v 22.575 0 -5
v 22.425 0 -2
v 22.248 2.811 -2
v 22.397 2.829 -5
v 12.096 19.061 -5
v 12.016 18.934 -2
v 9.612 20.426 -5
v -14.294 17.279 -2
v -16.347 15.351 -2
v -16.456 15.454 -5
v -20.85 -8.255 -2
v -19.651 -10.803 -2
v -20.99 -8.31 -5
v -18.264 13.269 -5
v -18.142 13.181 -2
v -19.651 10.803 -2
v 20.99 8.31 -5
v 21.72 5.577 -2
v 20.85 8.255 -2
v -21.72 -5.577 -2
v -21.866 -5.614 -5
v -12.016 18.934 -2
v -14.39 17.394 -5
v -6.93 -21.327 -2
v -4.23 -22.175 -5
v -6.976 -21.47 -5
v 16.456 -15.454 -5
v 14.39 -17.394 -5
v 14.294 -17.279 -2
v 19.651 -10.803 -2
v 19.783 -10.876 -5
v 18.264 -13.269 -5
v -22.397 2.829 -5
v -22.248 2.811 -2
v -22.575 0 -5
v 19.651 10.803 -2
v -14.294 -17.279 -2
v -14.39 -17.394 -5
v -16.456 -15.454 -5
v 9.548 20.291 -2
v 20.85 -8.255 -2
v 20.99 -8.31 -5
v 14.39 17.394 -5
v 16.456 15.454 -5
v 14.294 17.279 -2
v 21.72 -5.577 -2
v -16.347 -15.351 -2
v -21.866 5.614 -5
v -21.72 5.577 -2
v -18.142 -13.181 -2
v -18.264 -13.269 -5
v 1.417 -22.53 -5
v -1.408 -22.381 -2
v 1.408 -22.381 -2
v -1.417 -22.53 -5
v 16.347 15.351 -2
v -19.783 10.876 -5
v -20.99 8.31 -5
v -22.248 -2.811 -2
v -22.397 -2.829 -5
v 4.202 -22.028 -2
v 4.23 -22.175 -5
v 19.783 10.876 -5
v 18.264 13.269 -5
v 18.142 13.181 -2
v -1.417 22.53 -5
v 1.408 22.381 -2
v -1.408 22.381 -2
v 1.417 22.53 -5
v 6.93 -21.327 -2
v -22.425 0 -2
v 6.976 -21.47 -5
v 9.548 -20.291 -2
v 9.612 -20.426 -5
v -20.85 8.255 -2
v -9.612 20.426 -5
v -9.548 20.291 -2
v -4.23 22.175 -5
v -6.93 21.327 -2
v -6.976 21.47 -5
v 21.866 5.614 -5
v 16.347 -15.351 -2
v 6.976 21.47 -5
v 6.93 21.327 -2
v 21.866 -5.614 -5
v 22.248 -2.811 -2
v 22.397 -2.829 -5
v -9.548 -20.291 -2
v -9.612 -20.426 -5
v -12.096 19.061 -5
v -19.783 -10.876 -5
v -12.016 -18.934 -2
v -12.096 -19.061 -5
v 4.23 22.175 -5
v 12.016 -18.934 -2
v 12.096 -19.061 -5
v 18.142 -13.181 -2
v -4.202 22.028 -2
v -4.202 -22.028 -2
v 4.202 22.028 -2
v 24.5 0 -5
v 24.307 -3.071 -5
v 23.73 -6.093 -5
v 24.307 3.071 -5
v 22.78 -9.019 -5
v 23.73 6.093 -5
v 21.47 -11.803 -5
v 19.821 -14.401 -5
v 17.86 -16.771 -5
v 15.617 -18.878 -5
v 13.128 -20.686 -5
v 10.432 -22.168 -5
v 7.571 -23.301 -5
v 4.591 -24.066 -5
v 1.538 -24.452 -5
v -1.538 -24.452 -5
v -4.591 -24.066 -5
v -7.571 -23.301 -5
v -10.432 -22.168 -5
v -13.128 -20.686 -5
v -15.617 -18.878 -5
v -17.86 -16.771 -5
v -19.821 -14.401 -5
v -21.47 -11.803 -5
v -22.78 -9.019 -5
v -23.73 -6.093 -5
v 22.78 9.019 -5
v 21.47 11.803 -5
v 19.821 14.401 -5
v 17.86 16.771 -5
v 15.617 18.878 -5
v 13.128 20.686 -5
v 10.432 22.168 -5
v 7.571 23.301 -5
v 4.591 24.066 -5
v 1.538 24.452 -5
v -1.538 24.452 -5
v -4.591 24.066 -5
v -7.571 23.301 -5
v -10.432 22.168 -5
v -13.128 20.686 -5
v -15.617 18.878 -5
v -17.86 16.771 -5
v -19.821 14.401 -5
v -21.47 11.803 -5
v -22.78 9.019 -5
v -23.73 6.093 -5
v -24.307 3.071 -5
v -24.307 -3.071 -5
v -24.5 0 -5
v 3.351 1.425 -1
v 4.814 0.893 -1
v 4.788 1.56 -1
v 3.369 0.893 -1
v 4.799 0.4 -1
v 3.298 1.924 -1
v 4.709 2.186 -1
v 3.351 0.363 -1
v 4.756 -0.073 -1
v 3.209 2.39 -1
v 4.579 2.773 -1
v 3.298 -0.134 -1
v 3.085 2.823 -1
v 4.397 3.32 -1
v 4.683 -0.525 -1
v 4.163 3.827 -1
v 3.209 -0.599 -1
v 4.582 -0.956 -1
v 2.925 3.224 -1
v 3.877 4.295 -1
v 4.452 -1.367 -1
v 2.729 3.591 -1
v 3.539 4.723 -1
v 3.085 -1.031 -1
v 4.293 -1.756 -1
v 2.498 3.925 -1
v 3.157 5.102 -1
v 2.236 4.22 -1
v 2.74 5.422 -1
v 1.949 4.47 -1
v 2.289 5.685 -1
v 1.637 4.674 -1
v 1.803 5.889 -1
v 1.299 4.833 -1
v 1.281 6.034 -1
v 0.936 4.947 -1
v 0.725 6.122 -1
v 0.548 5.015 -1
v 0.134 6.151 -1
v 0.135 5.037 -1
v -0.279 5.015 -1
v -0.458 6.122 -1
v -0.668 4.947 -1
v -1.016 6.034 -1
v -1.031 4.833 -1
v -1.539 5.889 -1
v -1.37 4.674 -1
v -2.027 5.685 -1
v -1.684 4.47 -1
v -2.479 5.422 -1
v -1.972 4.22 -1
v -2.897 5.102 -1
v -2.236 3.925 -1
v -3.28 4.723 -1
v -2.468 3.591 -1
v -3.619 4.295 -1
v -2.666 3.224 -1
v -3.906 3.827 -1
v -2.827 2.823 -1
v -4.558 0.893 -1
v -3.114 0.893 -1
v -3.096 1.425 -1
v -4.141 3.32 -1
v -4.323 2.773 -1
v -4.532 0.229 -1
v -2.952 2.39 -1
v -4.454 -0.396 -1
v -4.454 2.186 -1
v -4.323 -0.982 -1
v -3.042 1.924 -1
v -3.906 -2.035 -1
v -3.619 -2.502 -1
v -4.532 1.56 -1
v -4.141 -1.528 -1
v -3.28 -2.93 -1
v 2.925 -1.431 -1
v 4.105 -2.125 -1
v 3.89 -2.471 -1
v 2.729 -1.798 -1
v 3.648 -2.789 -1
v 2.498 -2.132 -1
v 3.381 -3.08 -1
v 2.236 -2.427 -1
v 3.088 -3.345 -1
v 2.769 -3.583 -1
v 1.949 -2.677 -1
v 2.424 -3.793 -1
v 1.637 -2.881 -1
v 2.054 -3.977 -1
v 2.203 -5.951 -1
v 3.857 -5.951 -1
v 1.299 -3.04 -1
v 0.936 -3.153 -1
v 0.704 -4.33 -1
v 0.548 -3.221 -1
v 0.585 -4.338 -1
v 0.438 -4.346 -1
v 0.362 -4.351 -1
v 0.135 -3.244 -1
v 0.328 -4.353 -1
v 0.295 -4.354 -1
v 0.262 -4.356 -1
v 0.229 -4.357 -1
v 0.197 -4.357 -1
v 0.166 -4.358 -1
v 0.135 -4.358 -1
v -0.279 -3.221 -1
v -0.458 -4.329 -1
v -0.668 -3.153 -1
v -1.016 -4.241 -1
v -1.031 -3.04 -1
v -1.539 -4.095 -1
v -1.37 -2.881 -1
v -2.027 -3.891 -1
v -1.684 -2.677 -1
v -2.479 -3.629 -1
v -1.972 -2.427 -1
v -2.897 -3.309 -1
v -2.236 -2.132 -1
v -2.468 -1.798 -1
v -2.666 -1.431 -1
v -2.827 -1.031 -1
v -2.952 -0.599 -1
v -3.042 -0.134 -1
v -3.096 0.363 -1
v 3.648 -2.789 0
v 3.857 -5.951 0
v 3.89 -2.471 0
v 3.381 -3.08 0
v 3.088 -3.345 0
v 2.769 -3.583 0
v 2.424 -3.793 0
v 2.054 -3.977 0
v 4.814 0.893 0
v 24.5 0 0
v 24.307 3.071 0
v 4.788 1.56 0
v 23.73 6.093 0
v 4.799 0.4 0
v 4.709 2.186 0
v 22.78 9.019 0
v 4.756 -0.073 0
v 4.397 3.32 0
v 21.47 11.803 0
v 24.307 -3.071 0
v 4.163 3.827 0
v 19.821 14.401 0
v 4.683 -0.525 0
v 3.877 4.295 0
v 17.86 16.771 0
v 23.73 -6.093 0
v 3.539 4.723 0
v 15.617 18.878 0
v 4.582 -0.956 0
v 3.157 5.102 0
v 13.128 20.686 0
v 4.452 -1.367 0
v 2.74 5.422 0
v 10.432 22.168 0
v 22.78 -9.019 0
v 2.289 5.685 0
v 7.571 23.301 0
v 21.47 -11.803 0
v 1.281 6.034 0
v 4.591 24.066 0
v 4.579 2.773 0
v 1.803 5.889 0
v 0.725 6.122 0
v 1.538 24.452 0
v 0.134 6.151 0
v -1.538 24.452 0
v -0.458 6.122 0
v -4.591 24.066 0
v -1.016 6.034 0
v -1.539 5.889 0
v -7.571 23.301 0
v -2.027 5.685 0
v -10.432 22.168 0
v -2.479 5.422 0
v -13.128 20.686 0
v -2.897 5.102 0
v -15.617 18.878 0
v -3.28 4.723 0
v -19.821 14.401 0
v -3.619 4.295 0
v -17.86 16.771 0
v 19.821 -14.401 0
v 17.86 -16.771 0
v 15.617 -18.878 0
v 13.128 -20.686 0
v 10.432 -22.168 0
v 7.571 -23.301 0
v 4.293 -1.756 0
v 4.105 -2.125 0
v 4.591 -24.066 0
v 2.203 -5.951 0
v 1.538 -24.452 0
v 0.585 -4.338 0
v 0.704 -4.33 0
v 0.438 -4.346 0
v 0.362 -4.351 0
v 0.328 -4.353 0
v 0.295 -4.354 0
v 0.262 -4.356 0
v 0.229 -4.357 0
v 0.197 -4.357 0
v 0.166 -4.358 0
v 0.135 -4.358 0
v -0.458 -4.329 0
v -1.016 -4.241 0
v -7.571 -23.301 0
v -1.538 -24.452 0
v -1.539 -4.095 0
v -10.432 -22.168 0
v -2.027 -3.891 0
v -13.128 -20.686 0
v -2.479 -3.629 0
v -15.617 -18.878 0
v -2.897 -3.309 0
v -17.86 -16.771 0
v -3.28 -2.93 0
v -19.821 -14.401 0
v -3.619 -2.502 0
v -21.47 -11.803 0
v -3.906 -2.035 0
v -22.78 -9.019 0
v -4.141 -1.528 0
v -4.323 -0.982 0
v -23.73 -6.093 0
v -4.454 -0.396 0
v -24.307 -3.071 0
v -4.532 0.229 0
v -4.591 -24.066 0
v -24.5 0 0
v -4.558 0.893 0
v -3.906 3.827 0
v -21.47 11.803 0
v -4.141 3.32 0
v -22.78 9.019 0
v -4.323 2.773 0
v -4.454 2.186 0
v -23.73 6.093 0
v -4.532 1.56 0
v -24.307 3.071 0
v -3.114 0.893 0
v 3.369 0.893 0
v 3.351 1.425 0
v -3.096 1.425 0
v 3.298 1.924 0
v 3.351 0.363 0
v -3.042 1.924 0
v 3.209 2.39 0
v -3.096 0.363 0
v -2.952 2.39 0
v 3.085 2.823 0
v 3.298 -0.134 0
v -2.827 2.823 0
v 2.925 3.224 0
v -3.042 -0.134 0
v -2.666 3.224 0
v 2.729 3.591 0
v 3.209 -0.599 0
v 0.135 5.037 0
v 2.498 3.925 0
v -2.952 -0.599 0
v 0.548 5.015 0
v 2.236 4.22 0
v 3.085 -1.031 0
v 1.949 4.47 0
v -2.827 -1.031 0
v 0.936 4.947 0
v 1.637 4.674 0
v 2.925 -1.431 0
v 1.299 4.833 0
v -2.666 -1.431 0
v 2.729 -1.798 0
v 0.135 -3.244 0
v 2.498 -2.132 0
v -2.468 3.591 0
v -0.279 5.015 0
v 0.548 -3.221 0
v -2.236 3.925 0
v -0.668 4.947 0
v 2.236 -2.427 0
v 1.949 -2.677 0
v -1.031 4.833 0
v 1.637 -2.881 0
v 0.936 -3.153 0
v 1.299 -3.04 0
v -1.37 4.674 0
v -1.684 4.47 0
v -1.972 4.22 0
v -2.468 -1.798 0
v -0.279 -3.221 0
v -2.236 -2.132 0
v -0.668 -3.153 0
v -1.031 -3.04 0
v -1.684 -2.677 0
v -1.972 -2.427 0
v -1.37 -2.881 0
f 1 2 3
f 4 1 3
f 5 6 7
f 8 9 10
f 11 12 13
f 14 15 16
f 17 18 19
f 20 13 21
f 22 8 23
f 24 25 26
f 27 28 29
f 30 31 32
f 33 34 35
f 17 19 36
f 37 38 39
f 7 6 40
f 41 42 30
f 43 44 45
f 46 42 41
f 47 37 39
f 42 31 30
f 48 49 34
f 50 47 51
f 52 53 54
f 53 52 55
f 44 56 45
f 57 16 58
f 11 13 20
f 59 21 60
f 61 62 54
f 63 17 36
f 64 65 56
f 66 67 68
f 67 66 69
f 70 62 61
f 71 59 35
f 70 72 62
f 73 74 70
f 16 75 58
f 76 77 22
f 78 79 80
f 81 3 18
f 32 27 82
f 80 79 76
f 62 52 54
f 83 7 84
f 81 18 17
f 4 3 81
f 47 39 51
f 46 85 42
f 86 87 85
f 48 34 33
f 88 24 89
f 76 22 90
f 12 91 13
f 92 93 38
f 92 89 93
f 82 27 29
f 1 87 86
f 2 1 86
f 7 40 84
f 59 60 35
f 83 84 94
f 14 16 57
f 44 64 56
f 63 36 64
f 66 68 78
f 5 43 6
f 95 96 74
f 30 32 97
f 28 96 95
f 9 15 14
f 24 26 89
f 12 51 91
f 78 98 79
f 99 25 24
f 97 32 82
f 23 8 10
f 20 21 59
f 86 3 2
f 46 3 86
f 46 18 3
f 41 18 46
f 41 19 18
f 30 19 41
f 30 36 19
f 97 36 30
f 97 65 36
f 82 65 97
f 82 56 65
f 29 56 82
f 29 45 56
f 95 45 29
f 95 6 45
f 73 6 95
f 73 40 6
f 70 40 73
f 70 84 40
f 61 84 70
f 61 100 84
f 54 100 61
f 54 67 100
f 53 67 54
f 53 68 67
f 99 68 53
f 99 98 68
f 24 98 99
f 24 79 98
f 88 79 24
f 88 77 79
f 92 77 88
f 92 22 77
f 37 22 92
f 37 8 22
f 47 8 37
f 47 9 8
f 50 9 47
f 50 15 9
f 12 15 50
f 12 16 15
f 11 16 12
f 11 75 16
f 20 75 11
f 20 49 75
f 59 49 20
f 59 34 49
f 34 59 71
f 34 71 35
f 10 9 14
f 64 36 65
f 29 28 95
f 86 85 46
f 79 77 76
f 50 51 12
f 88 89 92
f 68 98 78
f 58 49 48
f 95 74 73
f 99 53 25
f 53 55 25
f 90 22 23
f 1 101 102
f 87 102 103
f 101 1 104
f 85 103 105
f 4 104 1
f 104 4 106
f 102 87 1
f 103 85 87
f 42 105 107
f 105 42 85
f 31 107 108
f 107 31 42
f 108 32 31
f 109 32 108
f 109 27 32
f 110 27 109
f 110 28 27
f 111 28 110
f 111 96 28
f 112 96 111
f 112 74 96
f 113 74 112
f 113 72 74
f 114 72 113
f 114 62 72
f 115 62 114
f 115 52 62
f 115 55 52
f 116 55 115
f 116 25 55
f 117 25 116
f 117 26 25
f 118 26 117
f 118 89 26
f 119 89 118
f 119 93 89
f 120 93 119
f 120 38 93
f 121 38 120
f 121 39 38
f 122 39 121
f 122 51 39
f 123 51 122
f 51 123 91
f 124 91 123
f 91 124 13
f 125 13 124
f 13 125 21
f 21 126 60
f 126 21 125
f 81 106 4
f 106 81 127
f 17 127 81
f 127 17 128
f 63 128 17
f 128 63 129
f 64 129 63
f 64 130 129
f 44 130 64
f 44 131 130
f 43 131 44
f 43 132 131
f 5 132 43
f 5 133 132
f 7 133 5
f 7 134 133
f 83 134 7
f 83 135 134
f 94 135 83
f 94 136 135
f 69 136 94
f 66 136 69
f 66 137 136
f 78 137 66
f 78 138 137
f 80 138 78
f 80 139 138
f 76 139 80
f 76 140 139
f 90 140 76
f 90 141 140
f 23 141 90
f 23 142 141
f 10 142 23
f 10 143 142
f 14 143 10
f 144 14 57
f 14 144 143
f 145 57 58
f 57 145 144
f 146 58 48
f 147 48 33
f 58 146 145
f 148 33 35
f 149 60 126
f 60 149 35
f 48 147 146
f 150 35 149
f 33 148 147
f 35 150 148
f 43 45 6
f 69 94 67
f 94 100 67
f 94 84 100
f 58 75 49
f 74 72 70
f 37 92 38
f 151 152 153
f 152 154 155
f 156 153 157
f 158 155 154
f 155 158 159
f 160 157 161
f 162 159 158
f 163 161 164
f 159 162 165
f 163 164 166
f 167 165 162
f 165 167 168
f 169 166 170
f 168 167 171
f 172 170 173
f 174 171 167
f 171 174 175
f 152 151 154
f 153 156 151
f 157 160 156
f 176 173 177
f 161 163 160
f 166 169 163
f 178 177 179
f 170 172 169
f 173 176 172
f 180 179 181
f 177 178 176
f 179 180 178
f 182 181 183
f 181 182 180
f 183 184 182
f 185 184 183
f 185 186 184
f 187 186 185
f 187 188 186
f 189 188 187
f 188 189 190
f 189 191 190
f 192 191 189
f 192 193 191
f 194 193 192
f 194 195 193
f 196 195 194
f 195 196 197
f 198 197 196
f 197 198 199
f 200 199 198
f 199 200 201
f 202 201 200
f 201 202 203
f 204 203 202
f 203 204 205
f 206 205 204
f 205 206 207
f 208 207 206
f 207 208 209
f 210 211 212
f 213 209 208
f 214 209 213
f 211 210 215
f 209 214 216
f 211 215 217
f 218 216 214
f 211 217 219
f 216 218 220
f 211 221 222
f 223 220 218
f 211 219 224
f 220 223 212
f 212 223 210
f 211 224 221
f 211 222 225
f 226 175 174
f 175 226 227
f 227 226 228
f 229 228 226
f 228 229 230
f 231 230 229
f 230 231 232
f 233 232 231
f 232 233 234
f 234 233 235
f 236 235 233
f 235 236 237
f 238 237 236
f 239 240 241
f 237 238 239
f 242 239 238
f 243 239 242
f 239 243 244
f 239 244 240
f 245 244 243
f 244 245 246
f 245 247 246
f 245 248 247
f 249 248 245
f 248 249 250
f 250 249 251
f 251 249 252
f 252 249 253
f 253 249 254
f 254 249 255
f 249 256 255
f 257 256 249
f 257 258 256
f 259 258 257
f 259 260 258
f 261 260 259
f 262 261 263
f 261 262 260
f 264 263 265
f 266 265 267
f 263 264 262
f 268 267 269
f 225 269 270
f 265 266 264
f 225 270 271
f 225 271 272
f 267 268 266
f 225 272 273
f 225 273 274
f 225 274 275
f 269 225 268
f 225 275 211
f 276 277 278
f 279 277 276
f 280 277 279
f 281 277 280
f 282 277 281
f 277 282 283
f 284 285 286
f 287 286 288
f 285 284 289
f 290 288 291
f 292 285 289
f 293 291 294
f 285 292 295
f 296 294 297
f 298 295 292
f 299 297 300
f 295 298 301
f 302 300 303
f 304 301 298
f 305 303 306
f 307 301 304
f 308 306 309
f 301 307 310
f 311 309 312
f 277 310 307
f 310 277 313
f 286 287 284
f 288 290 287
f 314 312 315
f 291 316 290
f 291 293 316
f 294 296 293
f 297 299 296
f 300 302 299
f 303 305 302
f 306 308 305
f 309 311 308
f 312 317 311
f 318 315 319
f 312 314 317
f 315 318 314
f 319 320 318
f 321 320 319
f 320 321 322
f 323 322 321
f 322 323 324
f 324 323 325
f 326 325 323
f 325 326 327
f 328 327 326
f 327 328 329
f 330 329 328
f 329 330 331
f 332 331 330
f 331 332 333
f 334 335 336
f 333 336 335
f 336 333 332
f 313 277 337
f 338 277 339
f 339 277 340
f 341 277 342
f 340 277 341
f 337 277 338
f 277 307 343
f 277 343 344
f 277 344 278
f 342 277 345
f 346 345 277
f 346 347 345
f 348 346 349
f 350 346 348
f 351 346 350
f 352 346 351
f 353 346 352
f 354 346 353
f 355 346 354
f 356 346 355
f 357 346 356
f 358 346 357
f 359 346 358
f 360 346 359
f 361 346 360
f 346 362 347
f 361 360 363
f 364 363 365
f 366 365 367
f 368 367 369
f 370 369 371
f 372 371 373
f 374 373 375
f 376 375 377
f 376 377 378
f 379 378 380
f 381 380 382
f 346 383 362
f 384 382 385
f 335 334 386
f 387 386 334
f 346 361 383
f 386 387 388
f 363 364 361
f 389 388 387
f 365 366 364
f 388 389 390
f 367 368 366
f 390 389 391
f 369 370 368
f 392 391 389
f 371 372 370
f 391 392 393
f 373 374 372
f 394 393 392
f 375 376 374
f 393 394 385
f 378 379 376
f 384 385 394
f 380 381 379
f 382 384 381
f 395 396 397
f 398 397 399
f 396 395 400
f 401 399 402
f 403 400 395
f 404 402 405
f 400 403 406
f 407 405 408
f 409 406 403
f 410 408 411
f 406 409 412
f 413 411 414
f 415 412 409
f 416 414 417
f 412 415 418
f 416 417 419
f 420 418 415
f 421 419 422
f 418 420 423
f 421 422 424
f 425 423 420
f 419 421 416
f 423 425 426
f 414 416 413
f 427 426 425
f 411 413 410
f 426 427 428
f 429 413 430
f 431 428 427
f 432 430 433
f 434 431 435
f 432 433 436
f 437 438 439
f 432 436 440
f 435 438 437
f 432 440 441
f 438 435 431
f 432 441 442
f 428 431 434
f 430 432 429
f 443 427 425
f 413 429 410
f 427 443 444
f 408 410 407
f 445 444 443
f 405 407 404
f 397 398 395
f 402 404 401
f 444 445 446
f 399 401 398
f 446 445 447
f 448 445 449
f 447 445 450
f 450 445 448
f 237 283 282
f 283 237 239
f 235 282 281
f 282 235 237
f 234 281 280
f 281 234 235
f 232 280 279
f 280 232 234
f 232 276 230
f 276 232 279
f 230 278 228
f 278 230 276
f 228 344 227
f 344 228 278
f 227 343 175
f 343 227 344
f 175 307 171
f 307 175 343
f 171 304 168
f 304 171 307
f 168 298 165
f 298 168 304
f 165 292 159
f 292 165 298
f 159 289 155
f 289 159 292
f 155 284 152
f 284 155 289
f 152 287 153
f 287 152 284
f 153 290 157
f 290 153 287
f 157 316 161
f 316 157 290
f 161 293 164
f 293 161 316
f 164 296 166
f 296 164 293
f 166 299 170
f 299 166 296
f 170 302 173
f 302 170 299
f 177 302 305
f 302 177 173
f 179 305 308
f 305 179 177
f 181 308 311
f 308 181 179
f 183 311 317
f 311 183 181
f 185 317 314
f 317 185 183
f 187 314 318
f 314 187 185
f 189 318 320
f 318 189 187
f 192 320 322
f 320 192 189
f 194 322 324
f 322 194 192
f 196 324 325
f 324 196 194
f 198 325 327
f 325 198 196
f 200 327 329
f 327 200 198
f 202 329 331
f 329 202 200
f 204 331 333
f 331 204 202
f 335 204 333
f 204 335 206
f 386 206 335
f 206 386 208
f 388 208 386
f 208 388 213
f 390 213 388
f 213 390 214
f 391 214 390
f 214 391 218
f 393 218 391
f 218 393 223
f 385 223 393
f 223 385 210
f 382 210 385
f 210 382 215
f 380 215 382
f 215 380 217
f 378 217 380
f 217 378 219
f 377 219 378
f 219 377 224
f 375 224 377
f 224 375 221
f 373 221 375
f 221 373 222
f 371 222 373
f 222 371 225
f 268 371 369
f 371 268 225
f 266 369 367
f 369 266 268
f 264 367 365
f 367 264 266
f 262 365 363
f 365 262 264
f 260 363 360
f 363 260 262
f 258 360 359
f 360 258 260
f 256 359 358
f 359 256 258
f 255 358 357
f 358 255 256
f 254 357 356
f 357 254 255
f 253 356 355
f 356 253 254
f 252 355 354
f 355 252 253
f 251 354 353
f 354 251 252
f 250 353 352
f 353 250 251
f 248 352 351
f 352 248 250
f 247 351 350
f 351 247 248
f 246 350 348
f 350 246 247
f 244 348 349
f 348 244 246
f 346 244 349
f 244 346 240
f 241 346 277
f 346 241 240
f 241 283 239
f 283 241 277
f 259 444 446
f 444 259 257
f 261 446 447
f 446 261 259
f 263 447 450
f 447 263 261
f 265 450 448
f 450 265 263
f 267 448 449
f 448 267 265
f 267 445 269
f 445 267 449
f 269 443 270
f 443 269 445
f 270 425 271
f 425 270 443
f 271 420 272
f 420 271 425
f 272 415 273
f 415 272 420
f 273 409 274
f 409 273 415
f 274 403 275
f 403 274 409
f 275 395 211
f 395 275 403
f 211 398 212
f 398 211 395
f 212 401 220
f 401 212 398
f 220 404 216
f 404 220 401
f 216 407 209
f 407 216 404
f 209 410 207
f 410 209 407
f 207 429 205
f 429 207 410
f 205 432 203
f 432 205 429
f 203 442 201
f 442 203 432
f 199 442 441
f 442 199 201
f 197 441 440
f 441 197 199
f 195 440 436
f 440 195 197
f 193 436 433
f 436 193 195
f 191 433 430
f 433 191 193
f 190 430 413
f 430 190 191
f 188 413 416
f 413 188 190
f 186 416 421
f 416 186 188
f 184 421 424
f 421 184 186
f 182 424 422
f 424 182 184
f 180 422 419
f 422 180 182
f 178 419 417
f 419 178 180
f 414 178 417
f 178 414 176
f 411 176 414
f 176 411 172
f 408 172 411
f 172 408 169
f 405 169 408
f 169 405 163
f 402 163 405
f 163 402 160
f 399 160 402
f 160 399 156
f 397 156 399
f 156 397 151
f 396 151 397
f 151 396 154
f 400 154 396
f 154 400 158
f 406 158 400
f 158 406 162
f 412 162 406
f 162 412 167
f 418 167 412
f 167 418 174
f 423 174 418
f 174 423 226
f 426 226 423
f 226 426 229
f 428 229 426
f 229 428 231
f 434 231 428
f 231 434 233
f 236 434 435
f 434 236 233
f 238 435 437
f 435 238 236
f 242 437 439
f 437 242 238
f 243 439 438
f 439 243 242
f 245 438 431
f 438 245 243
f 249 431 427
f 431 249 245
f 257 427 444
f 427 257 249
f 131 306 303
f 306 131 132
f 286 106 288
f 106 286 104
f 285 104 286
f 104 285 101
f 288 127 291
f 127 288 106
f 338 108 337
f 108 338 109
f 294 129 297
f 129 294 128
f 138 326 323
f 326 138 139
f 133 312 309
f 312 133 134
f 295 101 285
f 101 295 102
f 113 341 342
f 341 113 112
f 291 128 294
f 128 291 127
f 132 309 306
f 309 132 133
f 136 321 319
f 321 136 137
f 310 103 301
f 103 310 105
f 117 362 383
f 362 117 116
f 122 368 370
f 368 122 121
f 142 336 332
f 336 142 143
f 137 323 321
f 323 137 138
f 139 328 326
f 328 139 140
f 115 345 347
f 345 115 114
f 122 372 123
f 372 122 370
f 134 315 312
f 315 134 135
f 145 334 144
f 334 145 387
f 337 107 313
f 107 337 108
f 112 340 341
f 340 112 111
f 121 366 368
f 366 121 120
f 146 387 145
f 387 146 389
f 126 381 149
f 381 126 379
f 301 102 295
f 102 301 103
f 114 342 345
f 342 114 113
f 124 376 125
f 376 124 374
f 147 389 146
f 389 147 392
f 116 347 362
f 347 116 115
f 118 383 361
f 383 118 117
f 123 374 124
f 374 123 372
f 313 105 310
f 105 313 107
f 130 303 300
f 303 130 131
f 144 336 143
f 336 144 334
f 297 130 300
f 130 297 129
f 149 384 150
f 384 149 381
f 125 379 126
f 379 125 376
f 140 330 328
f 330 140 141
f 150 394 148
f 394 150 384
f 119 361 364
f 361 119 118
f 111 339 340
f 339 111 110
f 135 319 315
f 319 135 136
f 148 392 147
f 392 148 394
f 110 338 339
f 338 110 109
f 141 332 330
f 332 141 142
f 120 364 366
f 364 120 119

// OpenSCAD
$fn = 50;

difference() {
	union() {
		translate(v = [0, 0, -5.0]) {
			cylinder(h = 5, r = 24.5);
		}
	}
	union() {
		#translate(v = [0, 0, -5.0]) {
			cylinder(h = 3, r1 = 22.575, r2 = 22.425);
		}
		translate(v = [0, 0, -1]) {
			linear_extrude(height = 1) {
				text(font = "Impact", halign = "center", size = 10, text = "Q", valign = "center");
			}
		}
	}
}
